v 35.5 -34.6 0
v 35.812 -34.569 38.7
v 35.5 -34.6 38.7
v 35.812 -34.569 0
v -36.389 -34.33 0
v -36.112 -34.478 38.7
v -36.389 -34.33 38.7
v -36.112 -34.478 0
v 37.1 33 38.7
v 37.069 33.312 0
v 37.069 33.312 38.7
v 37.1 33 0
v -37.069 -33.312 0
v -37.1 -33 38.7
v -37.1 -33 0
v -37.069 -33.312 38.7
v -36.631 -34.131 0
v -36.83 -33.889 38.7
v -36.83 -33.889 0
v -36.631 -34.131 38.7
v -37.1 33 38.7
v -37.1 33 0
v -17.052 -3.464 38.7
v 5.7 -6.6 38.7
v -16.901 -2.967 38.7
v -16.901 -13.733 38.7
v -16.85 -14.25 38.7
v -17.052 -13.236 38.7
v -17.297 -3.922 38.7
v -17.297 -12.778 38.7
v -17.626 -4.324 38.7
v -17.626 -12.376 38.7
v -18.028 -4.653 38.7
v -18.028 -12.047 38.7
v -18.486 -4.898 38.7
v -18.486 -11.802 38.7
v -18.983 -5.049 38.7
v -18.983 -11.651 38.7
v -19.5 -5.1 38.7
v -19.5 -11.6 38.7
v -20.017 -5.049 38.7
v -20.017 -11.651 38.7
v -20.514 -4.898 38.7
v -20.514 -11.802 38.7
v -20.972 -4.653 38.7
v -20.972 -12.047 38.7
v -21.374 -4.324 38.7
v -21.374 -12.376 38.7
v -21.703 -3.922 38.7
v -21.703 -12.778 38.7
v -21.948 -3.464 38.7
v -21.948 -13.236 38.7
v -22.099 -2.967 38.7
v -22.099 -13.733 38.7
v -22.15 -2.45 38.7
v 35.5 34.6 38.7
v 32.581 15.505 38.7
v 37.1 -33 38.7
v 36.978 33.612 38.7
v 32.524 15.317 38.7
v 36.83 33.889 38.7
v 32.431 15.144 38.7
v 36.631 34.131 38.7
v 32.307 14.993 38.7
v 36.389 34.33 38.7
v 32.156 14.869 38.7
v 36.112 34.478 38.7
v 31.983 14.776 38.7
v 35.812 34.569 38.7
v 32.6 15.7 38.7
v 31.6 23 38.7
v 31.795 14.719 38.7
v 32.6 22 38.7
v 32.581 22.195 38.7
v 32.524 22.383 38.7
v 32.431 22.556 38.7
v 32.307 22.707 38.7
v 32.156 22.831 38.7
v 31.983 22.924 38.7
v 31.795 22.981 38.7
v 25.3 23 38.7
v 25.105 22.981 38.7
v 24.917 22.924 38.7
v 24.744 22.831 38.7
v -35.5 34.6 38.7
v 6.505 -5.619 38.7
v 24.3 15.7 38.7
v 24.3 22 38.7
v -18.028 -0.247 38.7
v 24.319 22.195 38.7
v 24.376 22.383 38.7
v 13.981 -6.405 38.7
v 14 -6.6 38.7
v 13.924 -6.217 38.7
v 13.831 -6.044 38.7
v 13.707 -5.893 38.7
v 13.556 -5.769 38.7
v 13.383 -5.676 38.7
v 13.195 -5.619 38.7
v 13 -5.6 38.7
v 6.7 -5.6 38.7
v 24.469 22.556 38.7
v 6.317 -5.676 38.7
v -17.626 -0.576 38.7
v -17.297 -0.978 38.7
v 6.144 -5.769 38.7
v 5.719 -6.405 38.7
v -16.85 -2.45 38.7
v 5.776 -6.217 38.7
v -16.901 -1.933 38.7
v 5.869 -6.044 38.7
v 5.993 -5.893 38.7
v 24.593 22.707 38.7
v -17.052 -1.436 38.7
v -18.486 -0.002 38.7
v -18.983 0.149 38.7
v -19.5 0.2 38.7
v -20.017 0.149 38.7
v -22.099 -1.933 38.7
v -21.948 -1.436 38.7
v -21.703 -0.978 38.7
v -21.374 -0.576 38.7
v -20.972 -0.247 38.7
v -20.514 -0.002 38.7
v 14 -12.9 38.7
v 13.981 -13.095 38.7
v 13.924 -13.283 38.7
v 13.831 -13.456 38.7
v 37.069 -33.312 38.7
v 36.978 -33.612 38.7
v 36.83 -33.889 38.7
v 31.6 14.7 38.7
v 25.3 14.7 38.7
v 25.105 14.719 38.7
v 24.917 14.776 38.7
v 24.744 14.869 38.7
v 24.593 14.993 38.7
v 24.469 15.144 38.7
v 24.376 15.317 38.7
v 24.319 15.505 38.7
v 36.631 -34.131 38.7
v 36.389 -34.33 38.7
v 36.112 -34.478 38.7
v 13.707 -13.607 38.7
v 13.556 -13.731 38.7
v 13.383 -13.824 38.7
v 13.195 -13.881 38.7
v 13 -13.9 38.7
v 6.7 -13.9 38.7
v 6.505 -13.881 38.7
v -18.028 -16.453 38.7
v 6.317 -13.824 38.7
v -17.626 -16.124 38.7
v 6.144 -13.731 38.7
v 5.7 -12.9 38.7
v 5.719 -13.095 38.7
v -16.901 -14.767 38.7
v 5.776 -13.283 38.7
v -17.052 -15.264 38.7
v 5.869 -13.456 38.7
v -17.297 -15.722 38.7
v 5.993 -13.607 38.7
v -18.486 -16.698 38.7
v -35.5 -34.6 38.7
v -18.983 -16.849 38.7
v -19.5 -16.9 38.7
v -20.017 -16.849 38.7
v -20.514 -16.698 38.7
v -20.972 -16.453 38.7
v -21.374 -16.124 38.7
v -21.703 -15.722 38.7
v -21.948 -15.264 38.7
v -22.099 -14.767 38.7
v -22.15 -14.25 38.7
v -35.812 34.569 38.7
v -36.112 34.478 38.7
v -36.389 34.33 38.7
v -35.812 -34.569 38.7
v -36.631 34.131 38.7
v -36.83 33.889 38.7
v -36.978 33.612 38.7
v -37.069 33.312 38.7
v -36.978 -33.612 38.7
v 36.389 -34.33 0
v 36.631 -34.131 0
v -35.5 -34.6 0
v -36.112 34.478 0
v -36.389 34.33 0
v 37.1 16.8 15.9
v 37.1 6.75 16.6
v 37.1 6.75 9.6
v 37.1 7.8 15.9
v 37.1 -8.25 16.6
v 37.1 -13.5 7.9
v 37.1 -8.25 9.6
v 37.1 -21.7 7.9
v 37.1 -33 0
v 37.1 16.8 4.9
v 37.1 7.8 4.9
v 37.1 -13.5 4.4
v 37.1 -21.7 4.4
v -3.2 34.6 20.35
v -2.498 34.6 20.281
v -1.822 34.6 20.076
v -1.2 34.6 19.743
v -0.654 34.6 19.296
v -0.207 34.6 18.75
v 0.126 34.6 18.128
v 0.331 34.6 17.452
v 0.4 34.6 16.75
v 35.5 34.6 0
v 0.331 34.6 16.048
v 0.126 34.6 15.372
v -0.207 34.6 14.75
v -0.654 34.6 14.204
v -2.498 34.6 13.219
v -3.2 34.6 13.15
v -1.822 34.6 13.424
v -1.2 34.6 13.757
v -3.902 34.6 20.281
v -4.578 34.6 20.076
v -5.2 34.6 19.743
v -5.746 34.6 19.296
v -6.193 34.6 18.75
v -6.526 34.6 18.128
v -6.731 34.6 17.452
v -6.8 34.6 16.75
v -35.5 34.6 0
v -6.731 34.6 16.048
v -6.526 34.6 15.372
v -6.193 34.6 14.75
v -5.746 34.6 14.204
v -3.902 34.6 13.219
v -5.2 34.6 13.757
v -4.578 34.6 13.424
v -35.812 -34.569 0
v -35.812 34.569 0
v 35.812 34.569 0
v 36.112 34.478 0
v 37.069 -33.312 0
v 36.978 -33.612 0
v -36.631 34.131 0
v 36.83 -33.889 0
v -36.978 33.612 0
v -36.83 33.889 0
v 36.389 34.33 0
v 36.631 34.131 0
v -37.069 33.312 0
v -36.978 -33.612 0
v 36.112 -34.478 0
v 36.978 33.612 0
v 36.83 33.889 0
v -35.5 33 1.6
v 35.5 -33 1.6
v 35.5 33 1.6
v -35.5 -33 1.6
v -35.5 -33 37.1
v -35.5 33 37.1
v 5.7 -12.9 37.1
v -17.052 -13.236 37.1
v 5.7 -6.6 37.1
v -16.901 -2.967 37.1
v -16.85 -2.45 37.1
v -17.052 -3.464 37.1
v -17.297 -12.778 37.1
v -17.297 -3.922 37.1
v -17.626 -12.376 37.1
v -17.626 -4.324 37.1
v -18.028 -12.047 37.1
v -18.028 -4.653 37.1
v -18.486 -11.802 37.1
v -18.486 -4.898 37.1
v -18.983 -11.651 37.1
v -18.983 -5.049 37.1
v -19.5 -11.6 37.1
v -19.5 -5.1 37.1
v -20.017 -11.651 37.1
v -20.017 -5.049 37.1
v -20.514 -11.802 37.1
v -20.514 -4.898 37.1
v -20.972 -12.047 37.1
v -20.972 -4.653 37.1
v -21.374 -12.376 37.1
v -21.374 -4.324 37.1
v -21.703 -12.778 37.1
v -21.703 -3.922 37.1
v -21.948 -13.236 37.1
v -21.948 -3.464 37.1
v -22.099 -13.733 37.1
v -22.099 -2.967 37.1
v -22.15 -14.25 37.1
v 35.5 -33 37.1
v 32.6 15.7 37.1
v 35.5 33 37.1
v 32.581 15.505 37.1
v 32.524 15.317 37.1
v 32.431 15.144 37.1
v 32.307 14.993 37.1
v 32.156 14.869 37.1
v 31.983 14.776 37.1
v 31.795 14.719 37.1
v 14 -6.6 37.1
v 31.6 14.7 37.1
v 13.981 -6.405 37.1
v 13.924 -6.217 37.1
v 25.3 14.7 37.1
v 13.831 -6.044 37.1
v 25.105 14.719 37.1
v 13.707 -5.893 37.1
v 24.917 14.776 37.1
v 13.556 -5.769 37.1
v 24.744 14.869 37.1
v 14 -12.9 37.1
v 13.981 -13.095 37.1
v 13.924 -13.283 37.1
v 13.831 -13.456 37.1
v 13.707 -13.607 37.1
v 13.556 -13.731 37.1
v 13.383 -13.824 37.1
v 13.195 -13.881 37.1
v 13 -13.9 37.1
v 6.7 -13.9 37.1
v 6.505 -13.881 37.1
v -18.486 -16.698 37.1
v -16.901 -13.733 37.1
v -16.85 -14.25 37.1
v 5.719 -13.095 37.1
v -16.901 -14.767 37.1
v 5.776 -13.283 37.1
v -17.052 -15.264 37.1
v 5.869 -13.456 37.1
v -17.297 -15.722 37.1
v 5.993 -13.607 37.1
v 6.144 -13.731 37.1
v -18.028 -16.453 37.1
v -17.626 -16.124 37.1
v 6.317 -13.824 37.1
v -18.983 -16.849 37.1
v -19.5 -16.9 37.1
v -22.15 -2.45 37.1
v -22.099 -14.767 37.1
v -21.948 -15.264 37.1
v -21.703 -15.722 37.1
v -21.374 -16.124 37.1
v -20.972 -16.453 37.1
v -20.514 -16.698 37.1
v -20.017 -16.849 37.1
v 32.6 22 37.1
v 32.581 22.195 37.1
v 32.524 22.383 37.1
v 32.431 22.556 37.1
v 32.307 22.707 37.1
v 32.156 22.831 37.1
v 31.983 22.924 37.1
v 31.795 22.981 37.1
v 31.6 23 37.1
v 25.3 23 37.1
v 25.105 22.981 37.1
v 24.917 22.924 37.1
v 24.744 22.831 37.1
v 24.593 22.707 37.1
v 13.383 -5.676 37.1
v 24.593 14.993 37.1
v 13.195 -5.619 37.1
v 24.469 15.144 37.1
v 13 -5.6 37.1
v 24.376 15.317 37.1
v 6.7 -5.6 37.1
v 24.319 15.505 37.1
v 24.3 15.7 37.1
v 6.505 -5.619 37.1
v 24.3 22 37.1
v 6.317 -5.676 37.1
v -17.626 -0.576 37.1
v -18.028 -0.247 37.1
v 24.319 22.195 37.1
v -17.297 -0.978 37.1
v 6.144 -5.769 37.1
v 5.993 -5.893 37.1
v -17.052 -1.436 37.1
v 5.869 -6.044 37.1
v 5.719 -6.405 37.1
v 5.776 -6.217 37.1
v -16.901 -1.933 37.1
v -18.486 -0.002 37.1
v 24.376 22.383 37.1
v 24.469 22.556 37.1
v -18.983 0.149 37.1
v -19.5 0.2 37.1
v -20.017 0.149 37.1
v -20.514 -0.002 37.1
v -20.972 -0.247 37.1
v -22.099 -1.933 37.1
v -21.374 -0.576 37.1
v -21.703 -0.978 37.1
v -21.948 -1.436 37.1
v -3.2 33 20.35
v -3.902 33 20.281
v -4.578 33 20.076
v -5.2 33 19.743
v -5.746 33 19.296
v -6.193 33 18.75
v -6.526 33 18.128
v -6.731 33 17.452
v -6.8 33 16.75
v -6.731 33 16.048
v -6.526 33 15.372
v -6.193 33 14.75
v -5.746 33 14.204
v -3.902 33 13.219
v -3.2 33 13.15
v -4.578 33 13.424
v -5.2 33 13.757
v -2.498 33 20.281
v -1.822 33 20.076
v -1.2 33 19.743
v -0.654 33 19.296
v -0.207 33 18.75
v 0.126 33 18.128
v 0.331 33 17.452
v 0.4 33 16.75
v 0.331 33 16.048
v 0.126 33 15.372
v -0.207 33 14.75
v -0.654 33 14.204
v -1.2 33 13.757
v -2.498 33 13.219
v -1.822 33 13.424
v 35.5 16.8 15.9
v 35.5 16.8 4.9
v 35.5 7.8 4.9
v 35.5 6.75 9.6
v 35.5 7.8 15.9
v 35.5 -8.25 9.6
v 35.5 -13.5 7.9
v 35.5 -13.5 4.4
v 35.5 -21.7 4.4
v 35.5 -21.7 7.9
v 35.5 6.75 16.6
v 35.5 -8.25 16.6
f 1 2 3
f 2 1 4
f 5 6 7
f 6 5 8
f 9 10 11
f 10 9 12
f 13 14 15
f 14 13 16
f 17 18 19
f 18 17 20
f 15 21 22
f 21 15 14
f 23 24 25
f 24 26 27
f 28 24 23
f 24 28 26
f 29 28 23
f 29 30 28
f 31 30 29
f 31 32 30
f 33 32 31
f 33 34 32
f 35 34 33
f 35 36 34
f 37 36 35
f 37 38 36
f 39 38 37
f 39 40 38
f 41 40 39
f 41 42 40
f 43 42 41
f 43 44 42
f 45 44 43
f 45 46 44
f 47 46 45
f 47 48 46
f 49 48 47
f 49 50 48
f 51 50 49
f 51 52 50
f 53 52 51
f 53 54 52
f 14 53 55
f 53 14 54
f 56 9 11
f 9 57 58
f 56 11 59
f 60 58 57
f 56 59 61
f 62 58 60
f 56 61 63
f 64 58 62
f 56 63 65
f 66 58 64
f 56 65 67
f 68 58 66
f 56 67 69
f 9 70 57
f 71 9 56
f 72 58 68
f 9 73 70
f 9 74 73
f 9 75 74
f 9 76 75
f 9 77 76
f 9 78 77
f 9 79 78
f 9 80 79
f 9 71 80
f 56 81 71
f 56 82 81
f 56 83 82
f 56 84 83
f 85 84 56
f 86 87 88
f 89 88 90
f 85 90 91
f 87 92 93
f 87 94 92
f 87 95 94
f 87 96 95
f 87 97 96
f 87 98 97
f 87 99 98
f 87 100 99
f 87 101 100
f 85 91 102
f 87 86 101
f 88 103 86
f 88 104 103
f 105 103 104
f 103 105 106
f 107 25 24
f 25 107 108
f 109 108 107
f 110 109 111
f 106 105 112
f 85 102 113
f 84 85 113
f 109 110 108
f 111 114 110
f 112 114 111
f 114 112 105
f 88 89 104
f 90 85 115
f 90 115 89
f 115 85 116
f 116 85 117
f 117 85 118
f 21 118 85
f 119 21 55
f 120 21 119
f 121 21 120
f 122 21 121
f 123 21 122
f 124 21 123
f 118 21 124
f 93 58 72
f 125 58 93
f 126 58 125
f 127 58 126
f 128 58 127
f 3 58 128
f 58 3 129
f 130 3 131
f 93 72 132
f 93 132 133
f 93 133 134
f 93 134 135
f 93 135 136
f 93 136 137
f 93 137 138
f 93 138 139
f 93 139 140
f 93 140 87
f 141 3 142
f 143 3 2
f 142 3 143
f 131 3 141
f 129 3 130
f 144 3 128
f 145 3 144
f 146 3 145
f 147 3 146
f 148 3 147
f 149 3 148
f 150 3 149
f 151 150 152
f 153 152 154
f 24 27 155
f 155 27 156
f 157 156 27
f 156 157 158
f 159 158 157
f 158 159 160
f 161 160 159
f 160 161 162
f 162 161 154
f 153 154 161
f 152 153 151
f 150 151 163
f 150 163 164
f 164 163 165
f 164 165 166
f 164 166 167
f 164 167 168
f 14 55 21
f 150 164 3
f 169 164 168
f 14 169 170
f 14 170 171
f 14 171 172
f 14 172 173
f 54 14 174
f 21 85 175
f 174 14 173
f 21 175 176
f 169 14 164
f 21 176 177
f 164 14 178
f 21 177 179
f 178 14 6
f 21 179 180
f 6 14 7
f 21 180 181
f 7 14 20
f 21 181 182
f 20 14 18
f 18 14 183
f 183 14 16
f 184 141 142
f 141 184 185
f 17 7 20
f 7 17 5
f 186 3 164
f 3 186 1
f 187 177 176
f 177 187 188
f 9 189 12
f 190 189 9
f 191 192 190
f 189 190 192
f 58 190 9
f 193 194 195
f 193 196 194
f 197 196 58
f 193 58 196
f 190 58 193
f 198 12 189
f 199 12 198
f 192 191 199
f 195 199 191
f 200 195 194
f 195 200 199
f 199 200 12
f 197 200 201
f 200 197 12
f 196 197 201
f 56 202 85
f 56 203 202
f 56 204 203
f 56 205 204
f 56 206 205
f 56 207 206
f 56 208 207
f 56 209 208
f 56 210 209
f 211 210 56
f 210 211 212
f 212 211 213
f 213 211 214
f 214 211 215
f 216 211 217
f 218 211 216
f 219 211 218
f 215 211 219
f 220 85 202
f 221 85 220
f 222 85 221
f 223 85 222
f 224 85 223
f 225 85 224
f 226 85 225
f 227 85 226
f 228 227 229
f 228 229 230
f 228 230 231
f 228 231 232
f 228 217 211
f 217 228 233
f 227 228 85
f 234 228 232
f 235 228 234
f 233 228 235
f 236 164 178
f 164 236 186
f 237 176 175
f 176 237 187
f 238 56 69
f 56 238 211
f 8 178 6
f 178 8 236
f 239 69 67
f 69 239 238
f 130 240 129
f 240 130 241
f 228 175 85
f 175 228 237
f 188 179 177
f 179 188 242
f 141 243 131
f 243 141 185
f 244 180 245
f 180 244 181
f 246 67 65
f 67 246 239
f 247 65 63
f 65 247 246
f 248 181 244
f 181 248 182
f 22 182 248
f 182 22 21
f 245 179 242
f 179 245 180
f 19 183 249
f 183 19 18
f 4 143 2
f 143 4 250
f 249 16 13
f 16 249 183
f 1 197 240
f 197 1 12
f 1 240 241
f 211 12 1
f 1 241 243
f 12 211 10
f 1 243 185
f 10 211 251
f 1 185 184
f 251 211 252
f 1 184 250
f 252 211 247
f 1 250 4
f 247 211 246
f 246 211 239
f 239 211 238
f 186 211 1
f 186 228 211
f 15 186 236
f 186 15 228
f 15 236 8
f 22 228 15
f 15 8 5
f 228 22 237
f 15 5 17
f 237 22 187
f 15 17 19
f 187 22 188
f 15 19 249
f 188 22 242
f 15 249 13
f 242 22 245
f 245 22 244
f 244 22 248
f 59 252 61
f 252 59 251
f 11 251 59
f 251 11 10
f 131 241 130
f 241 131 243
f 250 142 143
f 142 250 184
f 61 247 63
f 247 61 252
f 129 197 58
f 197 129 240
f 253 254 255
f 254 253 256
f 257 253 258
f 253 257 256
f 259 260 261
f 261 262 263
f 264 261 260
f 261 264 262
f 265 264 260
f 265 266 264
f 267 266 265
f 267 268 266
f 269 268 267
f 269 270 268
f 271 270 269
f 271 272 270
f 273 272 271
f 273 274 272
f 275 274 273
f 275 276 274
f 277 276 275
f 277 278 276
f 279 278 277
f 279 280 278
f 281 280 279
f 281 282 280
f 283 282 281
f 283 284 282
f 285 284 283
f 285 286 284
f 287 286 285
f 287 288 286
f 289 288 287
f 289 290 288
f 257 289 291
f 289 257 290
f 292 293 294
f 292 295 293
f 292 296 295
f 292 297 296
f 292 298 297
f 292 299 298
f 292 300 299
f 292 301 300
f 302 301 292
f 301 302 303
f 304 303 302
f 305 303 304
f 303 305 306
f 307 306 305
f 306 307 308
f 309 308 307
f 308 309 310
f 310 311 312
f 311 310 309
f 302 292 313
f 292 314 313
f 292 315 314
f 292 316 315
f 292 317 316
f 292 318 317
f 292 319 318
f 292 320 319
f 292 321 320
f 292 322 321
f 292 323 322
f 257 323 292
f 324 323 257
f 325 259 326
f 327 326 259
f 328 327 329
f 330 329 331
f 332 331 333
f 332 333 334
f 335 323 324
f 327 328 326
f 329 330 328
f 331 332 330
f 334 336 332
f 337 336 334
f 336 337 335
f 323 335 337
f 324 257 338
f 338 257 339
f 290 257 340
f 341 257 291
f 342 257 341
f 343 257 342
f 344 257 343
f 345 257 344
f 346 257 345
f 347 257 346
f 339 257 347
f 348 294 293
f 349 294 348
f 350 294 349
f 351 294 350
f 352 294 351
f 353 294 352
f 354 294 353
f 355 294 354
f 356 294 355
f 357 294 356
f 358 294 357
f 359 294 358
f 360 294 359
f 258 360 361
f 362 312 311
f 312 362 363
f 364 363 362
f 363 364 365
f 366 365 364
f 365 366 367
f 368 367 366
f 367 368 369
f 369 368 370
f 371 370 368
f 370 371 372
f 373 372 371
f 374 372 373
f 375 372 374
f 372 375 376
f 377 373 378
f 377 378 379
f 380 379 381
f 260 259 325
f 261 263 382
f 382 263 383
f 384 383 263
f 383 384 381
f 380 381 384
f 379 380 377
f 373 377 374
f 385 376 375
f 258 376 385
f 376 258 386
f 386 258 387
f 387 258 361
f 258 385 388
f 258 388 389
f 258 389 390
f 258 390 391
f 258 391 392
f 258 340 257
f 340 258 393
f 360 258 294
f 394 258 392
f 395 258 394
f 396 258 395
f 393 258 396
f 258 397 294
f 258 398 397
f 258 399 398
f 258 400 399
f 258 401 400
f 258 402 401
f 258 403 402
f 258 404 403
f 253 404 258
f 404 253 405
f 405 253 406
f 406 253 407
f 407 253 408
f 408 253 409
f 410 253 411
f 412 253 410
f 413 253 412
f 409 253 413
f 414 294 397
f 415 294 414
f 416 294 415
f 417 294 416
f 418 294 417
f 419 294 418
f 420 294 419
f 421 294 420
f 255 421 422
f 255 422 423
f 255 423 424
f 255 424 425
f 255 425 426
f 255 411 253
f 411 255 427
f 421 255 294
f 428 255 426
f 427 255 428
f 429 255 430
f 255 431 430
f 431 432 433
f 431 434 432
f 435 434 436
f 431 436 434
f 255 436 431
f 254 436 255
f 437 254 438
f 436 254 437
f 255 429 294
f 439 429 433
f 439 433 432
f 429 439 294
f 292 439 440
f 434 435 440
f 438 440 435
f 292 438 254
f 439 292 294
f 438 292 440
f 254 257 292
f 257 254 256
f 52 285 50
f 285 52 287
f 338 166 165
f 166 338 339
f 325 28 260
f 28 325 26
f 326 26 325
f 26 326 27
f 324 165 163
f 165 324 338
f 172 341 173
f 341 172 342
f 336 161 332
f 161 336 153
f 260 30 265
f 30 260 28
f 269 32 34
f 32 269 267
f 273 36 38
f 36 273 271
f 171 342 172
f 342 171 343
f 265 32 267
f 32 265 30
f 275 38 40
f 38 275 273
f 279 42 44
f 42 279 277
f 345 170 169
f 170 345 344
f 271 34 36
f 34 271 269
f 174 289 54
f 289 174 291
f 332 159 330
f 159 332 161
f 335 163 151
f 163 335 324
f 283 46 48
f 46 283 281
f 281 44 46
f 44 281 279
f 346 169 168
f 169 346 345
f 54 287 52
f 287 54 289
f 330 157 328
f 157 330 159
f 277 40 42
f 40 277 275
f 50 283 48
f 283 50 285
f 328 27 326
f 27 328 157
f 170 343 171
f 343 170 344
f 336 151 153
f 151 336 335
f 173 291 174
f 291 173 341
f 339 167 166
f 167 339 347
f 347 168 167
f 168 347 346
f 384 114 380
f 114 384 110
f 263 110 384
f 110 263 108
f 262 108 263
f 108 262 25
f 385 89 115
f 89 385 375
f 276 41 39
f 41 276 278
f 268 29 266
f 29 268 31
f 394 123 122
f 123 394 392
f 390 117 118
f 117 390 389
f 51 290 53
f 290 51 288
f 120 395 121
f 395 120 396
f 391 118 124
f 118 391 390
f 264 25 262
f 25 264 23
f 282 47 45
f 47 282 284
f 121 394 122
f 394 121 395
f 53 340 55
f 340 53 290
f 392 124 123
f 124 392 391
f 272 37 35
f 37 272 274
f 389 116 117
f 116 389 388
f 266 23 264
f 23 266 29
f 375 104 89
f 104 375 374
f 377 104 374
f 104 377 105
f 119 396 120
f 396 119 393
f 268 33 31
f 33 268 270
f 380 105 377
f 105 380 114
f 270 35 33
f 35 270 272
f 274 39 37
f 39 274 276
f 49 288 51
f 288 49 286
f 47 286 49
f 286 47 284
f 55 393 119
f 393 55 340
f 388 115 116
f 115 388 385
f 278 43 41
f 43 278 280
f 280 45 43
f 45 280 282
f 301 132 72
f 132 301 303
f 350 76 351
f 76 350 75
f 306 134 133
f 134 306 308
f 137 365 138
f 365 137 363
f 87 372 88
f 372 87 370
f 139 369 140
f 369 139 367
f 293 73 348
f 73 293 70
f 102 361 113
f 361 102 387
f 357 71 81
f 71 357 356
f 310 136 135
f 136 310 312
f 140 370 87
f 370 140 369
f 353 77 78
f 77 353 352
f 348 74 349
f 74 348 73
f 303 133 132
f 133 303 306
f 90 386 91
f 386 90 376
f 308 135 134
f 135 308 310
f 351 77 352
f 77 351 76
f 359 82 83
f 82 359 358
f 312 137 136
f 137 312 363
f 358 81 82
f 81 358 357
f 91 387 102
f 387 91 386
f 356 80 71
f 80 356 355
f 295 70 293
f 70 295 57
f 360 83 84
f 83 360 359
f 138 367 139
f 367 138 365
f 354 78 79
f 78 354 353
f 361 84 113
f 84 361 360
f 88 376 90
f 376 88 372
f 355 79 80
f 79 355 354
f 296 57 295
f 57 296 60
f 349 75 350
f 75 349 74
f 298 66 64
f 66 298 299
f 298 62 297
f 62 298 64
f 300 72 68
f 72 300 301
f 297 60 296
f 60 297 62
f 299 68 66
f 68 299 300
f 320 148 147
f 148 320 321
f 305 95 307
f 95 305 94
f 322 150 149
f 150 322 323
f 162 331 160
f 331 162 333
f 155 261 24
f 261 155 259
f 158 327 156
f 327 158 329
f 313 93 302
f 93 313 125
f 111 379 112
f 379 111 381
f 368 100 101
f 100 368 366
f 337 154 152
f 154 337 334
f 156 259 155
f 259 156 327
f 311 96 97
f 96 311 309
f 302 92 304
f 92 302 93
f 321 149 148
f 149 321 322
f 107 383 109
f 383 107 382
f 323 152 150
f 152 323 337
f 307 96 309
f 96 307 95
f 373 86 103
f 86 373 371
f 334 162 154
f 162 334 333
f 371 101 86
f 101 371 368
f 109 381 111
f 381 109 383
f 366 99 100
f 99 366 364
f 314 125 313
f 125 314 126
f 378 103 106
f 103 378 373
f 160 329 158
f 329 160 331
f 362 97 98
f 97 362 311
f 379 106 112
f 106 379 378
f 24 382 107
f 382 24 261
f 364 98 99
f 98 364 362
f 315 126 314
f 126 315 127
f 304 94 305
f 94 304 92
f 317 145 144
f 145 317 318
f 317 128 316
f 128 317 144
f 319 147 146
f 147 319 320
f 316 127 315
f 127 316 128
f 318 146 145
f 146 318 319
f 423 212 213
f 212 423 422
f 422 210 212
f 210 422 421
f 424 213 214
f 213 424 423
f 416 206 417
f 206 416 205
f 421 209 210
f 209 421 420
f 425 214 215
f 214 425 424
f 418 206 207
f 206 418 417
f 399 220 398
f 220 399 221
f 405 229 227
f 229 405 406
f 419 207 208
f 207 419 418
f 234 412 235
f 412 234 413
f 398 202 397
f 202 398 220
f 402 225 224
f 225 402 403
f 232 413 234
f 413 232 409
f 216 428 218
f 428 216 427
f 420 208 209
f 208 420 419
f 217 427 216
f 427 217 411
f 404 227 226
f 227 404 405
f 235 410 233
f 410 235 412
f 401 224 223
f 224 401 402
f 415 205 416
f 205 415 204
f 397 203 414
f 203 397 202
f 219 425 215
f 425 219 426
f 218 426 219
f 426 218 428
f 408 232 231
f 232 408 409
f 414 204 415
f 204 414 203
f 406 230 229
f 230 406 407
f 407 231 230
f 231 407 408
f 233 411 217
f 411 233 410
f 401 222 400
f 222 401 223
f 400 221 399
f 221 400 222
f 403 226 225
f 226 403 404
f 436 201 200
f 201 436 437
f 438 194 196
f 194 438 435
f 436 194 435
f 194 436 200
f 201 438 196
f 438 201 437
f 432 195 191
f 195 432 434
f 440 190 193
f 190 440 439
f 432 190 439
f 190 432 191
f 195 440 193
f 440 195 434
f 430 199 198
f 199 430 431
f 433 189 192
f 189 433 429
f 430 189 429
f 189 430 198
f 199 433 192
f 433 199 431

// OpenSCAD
// Anti-Recoil Device Case

$fn = 32;

board_len = 71.0;
board_wid = 66.0;
boards_h = 35.5;

wall_thick = 1.6;
rounding = 1.6;

potent_dia = 7.2;
potent_x = 38.5-3.5+7.3-potent_dia/2; // Distance to USB-facing side
potent_z = 14.3-2.75; // Distance to center of dial knob
potent_len = 15.0; // Length of knob shaft

led_dia = 5.3;
led_h = 7.5;
led_dist = 6.5; // Distance between the LEDs' edges
led_center_dist = led_dist + led_dia;
led_x = 55.0;
led_y = 18.75; // Distance from the left (-y) side

button_len = 6.1;
button_wid = button_len;
button_h = 3.0;
pimple_h = 1.0;
button_cap_h = 12.0 - pimple_h; // Length of button cap shaft
button_cap_len = button_len + 2.0; 
button_cap_wid = button_cap_len;
button_cap_rounding = 1.0;
button_cap_spacing = 0.1;

button_x = 3.0+button_len/2+1;
button_y = 52.9-button_len/2+2; // Distance from -y wall
rec_button_y = 19.5+button_len+3; // Anti-recoil toggle distance from reset
rec_button_x = 13.0+button_len-0.5;

micro_usb_len = 6.0;
micro_usb_wid = 8.2;
micro_usb_h = 3.5;
micro_usb_y = 1.0+18.5-micro_usb_wid/2;
micro_usb_z = 6.3-micro_usb_h;

usb_len = 10.0;
usb_wid = 15.0;
usb_h = 7.0;
usb_y = 24.75+usb_wid/2;
usb_z = 15.0-usb_h;

power_jack_len = 14.5;
power_jack_wid = 9.0;
power_jack_h = 11.0;
power_jack_y = 40.8+power_jack_wid/2;
power_jack_z = 14.3-power_jack_h;

module caseBox() {
    linear_extrude(boards_h+2*wall_thick)
    offset(rounding) offset(-rounding)
    square([board_len+2*wall_thick, board_wid+2*wall_thick], center=true);
}

module caseVoid() {
    translate([0,0,wall_thick])
    linear_extrude(boards_h)
    square([board_len, board_wid], center=true);
}

module caseHollow() {
    difference() {
        caseBox();
        caseVoid();
    }
}

module potentHole() {
    translate([board_len/2-potent_x,board_wid/2-potent_len/2,potent_dia/2+wall_thick+potent_z])
    rotate([-90,0,0])
    cylinder(h=potent_len, d=potent_dia);
}

module ledShape() {
    cylinder(d=led_dia, h=7.5);
}

// Shape is relative to the yellow LED's center
module ledHoles() {
    translate([board_len/2-led_x,led_y-board_wid/2,2*wall_thick+boards_h-led_h/2])
    union() {
        ledShape();
        translate([0, led_center_dist, 0])
        ledShape();
    }
}

module buttonShape() {
    linear_extrude(button_h)
    square([button_len, button_wid], center=true);
}

module buttonCapHole(spacing=0.0) {
    linear_extrude(button_cap_h)
    offset(button_cap_rounding) offset(-button_cap_rounding)
    square([button_cap_len+2*spacing, button_cap_wid+2*spacing], center=true);
}

module buttonCap(spacing=0.0) {
    translate([0,0,-0.6*pimple_h])
    difference() {
    translate([0,0,0.6*pimple_h])
    buttonCapHole(spacing);
    buttonShape();
    }
}

// Shape is relative to the RESET button's center
module buttonCapHoles() {
    translate([board_len/2-button_x,button_y-board_wid/2,2*wall_thick+boards_h-led_h/2]) {
        buttonCapHole(spacing=button_cap_spacing);
        translate([-rec_button_x, -rec_button_y, 0])
        buttonCapHole(spacing=button_cap_spacing);
    }
}

module microUsbHole() {
    translate([board_len/2,micro_usb_y-board_wid/2,wall_thick+micro_usb_z])
    linear_extrude(micro_usb_h)
    square([micro_usb_len, micro_usb_wid], center=true);
}

module usbHole() {
    translate([board_len/2,usb_y-board_wid/2,wall_thick+usb_z])
    linear_extrude(usb_h)
    square([usb_len, usb_wid], center=true);
}

module powerJackHole() {
    translate([board_len/2,power_jack_y-board_wid/2,wall_thick+power_jack_z])
    linear_extrude(power_jack_h)
    square([power_jack_len, power_jack_wid], center=true);
}

//buttonCap();

difference() {
caseHollow();
#potentHole();
#ledHoles();
#buttonCapHoles();
#microUsbHole();
#usbHole();
#powerJackHole();

//cube([50,50,50]);
}
